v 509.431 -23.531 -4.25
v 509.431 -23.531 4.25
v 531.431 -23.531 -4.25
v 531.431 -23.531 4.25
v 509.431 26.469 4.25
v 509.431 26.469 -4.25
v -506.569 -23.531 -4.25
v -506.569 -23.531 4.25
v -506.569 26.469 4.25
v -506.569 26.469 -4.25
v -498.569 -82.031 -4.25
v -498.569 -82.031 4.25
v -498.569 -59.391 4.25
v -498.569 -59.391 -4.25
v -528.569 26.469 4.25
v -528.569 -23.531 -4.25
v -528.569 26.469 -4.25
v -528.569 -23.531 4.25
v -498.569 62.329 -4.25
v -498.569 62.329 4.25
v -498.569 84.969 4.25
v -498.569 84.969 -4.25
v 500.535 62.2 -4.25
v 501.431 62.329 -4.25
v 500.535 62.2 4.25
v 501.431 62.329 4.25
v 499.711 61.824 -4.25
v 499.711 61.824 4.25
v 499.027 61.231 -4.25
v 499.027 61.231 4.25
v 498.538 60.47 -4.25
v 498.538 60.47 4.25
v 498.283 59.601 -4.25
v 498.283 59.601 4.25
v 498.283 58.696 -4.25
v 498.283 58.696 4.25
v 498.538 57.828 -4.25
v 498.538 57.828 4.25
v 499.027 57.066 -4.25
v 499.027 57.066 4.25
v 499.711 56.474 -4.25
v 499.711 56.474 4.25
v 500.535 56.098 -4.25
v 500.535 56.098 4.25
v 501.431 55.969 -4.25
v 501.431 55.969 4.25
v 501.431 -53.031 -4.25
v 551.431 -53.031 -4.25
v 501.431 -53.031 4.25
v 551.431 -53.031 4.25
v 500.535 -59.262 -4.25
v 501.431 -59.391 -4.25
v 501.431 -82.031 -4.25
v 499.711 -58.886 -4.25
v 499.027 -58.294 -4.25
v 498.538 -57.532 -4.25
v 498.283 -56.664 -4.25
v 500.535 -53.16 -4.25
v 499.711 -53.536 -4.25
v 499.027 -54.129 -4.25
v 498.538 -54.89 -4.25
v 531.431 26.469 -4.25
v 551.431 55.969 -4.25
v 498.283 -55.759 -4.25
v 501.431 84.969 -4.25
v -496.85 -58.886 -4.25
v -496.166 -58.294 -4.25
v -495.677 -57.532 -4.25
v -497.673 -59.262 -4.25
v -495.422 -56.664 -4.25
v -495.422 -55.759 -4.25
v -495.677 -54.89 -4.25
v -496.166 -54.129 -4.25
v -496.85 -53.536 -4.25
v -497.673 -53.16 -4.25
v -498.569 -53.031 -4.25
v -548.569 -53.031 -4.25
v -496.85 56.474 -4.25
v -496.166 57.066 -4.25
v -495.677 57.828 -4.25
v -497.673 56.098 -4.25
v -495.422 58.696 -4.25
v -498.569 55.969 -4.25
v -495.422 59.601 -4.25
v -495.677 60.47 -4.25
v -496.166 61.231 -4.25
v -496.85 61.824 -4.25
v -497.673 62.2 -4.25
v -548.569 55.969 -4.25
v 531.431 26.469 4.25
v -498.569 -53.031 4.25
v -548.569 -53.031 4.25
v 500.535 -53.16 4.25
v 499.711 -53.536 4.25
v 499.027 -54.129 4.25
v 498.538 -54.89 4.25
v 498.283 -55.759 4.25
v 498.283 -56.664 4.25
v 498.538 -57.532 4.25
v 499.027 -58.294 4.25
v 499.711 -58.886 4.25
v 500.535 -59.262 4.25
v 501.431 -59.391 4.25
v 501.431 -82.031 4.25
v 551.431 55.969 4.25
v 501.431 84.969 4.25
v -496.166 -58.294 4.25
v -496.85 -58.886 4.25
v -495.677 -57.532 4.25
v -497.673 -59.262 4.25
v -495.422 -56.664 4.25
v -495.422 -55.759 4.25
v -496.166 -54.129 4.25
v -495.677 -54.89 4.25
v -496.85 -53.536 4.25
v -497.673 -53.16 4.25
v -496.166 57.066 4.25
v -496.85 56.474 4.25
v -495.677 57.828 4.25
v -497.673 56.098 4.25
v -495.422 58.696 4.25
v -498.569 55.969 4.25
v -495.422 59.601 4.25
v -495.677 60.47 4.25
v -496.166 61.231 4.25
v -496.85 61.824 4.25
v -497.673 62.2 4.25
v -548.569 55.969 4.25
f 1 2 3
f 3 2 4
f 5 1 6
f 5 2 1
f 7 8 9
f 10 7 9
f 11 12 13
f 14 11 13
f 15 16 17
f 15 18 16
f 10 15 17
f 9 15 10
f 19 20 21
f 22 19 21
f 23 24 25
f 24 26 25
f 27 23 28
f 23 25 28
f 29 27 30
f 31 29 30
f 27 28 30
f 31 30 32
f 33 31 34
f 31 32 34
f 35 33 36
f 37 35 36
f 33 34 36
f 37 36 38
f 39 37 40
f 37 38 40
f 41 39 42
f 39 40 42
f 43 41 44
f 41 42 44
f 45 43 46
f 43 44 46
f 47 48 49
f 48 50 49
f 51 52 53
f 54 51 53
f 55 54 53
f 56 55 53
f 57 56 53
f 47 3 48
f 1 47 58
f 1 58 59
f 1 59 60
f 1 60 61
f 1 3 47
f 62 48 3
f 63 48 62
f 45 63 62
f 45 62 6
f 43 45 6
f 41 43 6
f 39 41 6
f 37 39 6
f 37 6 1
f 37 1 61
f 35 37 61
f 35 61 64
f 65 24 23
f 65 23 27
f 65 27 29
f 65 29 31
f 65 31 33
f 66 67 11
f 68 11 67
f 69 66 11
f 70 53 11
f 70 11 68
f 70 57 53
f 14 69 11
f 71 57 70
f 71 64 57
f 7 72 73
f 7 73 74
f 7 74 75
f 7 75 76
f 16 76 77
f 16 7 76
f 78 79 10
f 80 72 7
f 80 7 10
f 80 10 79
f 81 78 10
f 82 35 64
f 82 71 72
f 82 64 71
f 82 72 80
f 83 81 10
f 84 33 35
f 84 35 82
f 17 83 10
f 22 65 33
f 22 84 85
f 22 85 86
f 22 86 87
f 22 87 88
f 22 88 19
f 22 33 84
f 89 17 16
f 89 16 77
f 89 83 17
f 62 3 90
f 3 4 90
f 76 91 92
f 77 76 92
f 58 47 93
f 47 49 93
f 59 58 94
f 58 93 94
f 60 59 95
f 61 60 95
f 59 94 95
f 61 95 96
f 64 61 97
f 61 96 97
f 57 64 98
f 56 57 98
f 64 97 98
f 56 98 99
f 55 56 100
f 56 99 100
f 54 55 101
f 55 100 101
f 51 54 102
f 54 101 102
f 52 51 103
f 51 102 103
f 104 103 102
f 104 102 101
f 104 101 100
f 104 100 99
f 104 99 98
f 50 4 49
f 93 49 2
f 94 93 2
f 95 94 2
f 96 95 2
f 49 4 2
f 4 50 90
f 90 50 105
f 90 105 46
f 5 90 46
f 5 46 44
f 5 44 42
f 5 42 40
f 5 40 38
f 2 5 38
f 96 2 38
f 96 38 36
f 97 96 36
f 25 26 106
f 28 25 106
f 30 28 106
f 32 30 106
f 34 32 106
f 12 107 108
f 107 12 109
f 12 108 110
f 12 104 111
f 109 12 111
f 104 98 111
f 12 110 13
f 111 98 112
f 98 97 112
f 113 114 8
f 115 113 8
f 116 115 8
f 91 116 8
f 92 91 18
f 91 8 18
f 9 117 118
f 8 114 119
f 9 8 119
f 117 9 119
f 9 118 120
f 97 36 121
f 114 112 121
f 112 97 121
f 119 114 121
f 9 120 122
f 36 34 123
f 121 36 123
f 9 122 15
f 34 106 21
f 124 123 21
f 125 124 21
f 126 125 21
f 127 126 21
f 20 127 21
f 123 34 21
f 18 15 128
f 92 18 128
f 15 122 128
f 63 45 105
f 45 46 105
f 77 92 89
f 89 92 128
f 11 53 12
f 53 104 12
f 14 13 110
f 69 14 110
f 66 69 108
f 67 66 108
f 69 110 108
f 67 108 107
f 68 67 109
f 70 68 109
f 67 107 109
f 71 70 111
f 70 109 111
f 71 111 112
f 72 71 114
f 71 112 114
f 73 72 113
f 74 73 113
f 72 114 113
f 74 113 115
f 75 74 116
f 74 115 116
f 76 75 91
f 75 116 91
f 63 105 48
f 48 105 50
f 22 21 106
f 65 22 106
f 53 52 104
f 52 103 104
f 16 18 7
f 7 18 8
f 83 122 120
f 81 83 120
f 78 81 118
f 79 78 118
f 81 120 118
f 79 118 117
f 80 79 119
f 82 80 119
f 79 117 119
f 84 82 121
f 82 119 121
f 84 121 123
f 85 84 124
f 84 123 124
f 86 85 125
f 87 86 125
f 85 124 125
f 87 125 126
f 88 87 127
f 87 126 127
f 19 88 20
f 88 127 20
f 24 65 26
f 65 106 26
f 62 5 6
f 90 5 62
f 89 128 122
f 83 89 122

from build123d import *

# Parameters (mm, degrees)
SKETCH1_W           = 22
SKETCH1_H           = 50
BOSS_EXTRUDE1_DEPTH = 4.25


with BuildPart() as part:
    # Sketch1 → Boss-Extrude1 (new body, symmetric)
    with BuildSketch(Plane.XY):
        with BuildLine():
            Line((-498.569276331, 84.968707483), (501.430723669, 84.968707483))
            Line((501.430723669, 84.968707483), (501.430723669, 62.328707483))
            ThreePointArc((501.430723669, 62.328707483), (498.250723669, 59.148707483), (501.430723669, 55.968707483))
            Line((501.430723669, 55.968707483), (551.430723669, 55.968707483))
            Line((551.430723669, 55.968707483), (551.430723669, -53.031292517))
            Line((551.430723669, -53.031292517), (501.430723669, -53.031292517))
            ThreePointArc((501.430723669, -53.031292517), (498.250723669, -56.211292517), (501.430723669, -59.391292517))
            Line((501.430723669, -59.391292517), (501.430723669, -82.031292517))
            Line((501.430723669, -82.031292517), (-498.569276331, -82.031292517))
            Line((-498.569276331, -82.031292517), (-498.569276331, -59.391292517))
            ThreePointArc((-498.569276331, -59.391292517), (-495.389276331, -56.211292517), (-498.569276331, -53.031292517))
            Line((-498.569276331, -53.031292517), (-548.569276331, -53.031292517))
            Line((-548.569276331, -53.031292517), (-548.569276331, 55.968707483))
            Line((-548.569276331, 55.968707483), (-498.569276331, 55.968707483))
            ThreePointArc((-498.569276331, 55.968707483), (-495.389276331, 59.148707483), (-498.569276331, 62.328707483))
            Line((-498.569276331, 62.328707483), (-498.569276331, 84.968707483))
        make_face()
        with Locations((520.430723669, 1.468707483)):
            Rectangle(SKETCH1_W, SKETCH1_H, mode=Mode.SUBTRACT)
        with Locations((-517.569276331, 1.468707483)):
            Rectangle(SKETCH1_W, SKETCH1_H, mode=Mode.SUBTRACT)
    extrude(amount=BOSS_EXTRUDE1_DEPTH, both=True)


solid = part.part
